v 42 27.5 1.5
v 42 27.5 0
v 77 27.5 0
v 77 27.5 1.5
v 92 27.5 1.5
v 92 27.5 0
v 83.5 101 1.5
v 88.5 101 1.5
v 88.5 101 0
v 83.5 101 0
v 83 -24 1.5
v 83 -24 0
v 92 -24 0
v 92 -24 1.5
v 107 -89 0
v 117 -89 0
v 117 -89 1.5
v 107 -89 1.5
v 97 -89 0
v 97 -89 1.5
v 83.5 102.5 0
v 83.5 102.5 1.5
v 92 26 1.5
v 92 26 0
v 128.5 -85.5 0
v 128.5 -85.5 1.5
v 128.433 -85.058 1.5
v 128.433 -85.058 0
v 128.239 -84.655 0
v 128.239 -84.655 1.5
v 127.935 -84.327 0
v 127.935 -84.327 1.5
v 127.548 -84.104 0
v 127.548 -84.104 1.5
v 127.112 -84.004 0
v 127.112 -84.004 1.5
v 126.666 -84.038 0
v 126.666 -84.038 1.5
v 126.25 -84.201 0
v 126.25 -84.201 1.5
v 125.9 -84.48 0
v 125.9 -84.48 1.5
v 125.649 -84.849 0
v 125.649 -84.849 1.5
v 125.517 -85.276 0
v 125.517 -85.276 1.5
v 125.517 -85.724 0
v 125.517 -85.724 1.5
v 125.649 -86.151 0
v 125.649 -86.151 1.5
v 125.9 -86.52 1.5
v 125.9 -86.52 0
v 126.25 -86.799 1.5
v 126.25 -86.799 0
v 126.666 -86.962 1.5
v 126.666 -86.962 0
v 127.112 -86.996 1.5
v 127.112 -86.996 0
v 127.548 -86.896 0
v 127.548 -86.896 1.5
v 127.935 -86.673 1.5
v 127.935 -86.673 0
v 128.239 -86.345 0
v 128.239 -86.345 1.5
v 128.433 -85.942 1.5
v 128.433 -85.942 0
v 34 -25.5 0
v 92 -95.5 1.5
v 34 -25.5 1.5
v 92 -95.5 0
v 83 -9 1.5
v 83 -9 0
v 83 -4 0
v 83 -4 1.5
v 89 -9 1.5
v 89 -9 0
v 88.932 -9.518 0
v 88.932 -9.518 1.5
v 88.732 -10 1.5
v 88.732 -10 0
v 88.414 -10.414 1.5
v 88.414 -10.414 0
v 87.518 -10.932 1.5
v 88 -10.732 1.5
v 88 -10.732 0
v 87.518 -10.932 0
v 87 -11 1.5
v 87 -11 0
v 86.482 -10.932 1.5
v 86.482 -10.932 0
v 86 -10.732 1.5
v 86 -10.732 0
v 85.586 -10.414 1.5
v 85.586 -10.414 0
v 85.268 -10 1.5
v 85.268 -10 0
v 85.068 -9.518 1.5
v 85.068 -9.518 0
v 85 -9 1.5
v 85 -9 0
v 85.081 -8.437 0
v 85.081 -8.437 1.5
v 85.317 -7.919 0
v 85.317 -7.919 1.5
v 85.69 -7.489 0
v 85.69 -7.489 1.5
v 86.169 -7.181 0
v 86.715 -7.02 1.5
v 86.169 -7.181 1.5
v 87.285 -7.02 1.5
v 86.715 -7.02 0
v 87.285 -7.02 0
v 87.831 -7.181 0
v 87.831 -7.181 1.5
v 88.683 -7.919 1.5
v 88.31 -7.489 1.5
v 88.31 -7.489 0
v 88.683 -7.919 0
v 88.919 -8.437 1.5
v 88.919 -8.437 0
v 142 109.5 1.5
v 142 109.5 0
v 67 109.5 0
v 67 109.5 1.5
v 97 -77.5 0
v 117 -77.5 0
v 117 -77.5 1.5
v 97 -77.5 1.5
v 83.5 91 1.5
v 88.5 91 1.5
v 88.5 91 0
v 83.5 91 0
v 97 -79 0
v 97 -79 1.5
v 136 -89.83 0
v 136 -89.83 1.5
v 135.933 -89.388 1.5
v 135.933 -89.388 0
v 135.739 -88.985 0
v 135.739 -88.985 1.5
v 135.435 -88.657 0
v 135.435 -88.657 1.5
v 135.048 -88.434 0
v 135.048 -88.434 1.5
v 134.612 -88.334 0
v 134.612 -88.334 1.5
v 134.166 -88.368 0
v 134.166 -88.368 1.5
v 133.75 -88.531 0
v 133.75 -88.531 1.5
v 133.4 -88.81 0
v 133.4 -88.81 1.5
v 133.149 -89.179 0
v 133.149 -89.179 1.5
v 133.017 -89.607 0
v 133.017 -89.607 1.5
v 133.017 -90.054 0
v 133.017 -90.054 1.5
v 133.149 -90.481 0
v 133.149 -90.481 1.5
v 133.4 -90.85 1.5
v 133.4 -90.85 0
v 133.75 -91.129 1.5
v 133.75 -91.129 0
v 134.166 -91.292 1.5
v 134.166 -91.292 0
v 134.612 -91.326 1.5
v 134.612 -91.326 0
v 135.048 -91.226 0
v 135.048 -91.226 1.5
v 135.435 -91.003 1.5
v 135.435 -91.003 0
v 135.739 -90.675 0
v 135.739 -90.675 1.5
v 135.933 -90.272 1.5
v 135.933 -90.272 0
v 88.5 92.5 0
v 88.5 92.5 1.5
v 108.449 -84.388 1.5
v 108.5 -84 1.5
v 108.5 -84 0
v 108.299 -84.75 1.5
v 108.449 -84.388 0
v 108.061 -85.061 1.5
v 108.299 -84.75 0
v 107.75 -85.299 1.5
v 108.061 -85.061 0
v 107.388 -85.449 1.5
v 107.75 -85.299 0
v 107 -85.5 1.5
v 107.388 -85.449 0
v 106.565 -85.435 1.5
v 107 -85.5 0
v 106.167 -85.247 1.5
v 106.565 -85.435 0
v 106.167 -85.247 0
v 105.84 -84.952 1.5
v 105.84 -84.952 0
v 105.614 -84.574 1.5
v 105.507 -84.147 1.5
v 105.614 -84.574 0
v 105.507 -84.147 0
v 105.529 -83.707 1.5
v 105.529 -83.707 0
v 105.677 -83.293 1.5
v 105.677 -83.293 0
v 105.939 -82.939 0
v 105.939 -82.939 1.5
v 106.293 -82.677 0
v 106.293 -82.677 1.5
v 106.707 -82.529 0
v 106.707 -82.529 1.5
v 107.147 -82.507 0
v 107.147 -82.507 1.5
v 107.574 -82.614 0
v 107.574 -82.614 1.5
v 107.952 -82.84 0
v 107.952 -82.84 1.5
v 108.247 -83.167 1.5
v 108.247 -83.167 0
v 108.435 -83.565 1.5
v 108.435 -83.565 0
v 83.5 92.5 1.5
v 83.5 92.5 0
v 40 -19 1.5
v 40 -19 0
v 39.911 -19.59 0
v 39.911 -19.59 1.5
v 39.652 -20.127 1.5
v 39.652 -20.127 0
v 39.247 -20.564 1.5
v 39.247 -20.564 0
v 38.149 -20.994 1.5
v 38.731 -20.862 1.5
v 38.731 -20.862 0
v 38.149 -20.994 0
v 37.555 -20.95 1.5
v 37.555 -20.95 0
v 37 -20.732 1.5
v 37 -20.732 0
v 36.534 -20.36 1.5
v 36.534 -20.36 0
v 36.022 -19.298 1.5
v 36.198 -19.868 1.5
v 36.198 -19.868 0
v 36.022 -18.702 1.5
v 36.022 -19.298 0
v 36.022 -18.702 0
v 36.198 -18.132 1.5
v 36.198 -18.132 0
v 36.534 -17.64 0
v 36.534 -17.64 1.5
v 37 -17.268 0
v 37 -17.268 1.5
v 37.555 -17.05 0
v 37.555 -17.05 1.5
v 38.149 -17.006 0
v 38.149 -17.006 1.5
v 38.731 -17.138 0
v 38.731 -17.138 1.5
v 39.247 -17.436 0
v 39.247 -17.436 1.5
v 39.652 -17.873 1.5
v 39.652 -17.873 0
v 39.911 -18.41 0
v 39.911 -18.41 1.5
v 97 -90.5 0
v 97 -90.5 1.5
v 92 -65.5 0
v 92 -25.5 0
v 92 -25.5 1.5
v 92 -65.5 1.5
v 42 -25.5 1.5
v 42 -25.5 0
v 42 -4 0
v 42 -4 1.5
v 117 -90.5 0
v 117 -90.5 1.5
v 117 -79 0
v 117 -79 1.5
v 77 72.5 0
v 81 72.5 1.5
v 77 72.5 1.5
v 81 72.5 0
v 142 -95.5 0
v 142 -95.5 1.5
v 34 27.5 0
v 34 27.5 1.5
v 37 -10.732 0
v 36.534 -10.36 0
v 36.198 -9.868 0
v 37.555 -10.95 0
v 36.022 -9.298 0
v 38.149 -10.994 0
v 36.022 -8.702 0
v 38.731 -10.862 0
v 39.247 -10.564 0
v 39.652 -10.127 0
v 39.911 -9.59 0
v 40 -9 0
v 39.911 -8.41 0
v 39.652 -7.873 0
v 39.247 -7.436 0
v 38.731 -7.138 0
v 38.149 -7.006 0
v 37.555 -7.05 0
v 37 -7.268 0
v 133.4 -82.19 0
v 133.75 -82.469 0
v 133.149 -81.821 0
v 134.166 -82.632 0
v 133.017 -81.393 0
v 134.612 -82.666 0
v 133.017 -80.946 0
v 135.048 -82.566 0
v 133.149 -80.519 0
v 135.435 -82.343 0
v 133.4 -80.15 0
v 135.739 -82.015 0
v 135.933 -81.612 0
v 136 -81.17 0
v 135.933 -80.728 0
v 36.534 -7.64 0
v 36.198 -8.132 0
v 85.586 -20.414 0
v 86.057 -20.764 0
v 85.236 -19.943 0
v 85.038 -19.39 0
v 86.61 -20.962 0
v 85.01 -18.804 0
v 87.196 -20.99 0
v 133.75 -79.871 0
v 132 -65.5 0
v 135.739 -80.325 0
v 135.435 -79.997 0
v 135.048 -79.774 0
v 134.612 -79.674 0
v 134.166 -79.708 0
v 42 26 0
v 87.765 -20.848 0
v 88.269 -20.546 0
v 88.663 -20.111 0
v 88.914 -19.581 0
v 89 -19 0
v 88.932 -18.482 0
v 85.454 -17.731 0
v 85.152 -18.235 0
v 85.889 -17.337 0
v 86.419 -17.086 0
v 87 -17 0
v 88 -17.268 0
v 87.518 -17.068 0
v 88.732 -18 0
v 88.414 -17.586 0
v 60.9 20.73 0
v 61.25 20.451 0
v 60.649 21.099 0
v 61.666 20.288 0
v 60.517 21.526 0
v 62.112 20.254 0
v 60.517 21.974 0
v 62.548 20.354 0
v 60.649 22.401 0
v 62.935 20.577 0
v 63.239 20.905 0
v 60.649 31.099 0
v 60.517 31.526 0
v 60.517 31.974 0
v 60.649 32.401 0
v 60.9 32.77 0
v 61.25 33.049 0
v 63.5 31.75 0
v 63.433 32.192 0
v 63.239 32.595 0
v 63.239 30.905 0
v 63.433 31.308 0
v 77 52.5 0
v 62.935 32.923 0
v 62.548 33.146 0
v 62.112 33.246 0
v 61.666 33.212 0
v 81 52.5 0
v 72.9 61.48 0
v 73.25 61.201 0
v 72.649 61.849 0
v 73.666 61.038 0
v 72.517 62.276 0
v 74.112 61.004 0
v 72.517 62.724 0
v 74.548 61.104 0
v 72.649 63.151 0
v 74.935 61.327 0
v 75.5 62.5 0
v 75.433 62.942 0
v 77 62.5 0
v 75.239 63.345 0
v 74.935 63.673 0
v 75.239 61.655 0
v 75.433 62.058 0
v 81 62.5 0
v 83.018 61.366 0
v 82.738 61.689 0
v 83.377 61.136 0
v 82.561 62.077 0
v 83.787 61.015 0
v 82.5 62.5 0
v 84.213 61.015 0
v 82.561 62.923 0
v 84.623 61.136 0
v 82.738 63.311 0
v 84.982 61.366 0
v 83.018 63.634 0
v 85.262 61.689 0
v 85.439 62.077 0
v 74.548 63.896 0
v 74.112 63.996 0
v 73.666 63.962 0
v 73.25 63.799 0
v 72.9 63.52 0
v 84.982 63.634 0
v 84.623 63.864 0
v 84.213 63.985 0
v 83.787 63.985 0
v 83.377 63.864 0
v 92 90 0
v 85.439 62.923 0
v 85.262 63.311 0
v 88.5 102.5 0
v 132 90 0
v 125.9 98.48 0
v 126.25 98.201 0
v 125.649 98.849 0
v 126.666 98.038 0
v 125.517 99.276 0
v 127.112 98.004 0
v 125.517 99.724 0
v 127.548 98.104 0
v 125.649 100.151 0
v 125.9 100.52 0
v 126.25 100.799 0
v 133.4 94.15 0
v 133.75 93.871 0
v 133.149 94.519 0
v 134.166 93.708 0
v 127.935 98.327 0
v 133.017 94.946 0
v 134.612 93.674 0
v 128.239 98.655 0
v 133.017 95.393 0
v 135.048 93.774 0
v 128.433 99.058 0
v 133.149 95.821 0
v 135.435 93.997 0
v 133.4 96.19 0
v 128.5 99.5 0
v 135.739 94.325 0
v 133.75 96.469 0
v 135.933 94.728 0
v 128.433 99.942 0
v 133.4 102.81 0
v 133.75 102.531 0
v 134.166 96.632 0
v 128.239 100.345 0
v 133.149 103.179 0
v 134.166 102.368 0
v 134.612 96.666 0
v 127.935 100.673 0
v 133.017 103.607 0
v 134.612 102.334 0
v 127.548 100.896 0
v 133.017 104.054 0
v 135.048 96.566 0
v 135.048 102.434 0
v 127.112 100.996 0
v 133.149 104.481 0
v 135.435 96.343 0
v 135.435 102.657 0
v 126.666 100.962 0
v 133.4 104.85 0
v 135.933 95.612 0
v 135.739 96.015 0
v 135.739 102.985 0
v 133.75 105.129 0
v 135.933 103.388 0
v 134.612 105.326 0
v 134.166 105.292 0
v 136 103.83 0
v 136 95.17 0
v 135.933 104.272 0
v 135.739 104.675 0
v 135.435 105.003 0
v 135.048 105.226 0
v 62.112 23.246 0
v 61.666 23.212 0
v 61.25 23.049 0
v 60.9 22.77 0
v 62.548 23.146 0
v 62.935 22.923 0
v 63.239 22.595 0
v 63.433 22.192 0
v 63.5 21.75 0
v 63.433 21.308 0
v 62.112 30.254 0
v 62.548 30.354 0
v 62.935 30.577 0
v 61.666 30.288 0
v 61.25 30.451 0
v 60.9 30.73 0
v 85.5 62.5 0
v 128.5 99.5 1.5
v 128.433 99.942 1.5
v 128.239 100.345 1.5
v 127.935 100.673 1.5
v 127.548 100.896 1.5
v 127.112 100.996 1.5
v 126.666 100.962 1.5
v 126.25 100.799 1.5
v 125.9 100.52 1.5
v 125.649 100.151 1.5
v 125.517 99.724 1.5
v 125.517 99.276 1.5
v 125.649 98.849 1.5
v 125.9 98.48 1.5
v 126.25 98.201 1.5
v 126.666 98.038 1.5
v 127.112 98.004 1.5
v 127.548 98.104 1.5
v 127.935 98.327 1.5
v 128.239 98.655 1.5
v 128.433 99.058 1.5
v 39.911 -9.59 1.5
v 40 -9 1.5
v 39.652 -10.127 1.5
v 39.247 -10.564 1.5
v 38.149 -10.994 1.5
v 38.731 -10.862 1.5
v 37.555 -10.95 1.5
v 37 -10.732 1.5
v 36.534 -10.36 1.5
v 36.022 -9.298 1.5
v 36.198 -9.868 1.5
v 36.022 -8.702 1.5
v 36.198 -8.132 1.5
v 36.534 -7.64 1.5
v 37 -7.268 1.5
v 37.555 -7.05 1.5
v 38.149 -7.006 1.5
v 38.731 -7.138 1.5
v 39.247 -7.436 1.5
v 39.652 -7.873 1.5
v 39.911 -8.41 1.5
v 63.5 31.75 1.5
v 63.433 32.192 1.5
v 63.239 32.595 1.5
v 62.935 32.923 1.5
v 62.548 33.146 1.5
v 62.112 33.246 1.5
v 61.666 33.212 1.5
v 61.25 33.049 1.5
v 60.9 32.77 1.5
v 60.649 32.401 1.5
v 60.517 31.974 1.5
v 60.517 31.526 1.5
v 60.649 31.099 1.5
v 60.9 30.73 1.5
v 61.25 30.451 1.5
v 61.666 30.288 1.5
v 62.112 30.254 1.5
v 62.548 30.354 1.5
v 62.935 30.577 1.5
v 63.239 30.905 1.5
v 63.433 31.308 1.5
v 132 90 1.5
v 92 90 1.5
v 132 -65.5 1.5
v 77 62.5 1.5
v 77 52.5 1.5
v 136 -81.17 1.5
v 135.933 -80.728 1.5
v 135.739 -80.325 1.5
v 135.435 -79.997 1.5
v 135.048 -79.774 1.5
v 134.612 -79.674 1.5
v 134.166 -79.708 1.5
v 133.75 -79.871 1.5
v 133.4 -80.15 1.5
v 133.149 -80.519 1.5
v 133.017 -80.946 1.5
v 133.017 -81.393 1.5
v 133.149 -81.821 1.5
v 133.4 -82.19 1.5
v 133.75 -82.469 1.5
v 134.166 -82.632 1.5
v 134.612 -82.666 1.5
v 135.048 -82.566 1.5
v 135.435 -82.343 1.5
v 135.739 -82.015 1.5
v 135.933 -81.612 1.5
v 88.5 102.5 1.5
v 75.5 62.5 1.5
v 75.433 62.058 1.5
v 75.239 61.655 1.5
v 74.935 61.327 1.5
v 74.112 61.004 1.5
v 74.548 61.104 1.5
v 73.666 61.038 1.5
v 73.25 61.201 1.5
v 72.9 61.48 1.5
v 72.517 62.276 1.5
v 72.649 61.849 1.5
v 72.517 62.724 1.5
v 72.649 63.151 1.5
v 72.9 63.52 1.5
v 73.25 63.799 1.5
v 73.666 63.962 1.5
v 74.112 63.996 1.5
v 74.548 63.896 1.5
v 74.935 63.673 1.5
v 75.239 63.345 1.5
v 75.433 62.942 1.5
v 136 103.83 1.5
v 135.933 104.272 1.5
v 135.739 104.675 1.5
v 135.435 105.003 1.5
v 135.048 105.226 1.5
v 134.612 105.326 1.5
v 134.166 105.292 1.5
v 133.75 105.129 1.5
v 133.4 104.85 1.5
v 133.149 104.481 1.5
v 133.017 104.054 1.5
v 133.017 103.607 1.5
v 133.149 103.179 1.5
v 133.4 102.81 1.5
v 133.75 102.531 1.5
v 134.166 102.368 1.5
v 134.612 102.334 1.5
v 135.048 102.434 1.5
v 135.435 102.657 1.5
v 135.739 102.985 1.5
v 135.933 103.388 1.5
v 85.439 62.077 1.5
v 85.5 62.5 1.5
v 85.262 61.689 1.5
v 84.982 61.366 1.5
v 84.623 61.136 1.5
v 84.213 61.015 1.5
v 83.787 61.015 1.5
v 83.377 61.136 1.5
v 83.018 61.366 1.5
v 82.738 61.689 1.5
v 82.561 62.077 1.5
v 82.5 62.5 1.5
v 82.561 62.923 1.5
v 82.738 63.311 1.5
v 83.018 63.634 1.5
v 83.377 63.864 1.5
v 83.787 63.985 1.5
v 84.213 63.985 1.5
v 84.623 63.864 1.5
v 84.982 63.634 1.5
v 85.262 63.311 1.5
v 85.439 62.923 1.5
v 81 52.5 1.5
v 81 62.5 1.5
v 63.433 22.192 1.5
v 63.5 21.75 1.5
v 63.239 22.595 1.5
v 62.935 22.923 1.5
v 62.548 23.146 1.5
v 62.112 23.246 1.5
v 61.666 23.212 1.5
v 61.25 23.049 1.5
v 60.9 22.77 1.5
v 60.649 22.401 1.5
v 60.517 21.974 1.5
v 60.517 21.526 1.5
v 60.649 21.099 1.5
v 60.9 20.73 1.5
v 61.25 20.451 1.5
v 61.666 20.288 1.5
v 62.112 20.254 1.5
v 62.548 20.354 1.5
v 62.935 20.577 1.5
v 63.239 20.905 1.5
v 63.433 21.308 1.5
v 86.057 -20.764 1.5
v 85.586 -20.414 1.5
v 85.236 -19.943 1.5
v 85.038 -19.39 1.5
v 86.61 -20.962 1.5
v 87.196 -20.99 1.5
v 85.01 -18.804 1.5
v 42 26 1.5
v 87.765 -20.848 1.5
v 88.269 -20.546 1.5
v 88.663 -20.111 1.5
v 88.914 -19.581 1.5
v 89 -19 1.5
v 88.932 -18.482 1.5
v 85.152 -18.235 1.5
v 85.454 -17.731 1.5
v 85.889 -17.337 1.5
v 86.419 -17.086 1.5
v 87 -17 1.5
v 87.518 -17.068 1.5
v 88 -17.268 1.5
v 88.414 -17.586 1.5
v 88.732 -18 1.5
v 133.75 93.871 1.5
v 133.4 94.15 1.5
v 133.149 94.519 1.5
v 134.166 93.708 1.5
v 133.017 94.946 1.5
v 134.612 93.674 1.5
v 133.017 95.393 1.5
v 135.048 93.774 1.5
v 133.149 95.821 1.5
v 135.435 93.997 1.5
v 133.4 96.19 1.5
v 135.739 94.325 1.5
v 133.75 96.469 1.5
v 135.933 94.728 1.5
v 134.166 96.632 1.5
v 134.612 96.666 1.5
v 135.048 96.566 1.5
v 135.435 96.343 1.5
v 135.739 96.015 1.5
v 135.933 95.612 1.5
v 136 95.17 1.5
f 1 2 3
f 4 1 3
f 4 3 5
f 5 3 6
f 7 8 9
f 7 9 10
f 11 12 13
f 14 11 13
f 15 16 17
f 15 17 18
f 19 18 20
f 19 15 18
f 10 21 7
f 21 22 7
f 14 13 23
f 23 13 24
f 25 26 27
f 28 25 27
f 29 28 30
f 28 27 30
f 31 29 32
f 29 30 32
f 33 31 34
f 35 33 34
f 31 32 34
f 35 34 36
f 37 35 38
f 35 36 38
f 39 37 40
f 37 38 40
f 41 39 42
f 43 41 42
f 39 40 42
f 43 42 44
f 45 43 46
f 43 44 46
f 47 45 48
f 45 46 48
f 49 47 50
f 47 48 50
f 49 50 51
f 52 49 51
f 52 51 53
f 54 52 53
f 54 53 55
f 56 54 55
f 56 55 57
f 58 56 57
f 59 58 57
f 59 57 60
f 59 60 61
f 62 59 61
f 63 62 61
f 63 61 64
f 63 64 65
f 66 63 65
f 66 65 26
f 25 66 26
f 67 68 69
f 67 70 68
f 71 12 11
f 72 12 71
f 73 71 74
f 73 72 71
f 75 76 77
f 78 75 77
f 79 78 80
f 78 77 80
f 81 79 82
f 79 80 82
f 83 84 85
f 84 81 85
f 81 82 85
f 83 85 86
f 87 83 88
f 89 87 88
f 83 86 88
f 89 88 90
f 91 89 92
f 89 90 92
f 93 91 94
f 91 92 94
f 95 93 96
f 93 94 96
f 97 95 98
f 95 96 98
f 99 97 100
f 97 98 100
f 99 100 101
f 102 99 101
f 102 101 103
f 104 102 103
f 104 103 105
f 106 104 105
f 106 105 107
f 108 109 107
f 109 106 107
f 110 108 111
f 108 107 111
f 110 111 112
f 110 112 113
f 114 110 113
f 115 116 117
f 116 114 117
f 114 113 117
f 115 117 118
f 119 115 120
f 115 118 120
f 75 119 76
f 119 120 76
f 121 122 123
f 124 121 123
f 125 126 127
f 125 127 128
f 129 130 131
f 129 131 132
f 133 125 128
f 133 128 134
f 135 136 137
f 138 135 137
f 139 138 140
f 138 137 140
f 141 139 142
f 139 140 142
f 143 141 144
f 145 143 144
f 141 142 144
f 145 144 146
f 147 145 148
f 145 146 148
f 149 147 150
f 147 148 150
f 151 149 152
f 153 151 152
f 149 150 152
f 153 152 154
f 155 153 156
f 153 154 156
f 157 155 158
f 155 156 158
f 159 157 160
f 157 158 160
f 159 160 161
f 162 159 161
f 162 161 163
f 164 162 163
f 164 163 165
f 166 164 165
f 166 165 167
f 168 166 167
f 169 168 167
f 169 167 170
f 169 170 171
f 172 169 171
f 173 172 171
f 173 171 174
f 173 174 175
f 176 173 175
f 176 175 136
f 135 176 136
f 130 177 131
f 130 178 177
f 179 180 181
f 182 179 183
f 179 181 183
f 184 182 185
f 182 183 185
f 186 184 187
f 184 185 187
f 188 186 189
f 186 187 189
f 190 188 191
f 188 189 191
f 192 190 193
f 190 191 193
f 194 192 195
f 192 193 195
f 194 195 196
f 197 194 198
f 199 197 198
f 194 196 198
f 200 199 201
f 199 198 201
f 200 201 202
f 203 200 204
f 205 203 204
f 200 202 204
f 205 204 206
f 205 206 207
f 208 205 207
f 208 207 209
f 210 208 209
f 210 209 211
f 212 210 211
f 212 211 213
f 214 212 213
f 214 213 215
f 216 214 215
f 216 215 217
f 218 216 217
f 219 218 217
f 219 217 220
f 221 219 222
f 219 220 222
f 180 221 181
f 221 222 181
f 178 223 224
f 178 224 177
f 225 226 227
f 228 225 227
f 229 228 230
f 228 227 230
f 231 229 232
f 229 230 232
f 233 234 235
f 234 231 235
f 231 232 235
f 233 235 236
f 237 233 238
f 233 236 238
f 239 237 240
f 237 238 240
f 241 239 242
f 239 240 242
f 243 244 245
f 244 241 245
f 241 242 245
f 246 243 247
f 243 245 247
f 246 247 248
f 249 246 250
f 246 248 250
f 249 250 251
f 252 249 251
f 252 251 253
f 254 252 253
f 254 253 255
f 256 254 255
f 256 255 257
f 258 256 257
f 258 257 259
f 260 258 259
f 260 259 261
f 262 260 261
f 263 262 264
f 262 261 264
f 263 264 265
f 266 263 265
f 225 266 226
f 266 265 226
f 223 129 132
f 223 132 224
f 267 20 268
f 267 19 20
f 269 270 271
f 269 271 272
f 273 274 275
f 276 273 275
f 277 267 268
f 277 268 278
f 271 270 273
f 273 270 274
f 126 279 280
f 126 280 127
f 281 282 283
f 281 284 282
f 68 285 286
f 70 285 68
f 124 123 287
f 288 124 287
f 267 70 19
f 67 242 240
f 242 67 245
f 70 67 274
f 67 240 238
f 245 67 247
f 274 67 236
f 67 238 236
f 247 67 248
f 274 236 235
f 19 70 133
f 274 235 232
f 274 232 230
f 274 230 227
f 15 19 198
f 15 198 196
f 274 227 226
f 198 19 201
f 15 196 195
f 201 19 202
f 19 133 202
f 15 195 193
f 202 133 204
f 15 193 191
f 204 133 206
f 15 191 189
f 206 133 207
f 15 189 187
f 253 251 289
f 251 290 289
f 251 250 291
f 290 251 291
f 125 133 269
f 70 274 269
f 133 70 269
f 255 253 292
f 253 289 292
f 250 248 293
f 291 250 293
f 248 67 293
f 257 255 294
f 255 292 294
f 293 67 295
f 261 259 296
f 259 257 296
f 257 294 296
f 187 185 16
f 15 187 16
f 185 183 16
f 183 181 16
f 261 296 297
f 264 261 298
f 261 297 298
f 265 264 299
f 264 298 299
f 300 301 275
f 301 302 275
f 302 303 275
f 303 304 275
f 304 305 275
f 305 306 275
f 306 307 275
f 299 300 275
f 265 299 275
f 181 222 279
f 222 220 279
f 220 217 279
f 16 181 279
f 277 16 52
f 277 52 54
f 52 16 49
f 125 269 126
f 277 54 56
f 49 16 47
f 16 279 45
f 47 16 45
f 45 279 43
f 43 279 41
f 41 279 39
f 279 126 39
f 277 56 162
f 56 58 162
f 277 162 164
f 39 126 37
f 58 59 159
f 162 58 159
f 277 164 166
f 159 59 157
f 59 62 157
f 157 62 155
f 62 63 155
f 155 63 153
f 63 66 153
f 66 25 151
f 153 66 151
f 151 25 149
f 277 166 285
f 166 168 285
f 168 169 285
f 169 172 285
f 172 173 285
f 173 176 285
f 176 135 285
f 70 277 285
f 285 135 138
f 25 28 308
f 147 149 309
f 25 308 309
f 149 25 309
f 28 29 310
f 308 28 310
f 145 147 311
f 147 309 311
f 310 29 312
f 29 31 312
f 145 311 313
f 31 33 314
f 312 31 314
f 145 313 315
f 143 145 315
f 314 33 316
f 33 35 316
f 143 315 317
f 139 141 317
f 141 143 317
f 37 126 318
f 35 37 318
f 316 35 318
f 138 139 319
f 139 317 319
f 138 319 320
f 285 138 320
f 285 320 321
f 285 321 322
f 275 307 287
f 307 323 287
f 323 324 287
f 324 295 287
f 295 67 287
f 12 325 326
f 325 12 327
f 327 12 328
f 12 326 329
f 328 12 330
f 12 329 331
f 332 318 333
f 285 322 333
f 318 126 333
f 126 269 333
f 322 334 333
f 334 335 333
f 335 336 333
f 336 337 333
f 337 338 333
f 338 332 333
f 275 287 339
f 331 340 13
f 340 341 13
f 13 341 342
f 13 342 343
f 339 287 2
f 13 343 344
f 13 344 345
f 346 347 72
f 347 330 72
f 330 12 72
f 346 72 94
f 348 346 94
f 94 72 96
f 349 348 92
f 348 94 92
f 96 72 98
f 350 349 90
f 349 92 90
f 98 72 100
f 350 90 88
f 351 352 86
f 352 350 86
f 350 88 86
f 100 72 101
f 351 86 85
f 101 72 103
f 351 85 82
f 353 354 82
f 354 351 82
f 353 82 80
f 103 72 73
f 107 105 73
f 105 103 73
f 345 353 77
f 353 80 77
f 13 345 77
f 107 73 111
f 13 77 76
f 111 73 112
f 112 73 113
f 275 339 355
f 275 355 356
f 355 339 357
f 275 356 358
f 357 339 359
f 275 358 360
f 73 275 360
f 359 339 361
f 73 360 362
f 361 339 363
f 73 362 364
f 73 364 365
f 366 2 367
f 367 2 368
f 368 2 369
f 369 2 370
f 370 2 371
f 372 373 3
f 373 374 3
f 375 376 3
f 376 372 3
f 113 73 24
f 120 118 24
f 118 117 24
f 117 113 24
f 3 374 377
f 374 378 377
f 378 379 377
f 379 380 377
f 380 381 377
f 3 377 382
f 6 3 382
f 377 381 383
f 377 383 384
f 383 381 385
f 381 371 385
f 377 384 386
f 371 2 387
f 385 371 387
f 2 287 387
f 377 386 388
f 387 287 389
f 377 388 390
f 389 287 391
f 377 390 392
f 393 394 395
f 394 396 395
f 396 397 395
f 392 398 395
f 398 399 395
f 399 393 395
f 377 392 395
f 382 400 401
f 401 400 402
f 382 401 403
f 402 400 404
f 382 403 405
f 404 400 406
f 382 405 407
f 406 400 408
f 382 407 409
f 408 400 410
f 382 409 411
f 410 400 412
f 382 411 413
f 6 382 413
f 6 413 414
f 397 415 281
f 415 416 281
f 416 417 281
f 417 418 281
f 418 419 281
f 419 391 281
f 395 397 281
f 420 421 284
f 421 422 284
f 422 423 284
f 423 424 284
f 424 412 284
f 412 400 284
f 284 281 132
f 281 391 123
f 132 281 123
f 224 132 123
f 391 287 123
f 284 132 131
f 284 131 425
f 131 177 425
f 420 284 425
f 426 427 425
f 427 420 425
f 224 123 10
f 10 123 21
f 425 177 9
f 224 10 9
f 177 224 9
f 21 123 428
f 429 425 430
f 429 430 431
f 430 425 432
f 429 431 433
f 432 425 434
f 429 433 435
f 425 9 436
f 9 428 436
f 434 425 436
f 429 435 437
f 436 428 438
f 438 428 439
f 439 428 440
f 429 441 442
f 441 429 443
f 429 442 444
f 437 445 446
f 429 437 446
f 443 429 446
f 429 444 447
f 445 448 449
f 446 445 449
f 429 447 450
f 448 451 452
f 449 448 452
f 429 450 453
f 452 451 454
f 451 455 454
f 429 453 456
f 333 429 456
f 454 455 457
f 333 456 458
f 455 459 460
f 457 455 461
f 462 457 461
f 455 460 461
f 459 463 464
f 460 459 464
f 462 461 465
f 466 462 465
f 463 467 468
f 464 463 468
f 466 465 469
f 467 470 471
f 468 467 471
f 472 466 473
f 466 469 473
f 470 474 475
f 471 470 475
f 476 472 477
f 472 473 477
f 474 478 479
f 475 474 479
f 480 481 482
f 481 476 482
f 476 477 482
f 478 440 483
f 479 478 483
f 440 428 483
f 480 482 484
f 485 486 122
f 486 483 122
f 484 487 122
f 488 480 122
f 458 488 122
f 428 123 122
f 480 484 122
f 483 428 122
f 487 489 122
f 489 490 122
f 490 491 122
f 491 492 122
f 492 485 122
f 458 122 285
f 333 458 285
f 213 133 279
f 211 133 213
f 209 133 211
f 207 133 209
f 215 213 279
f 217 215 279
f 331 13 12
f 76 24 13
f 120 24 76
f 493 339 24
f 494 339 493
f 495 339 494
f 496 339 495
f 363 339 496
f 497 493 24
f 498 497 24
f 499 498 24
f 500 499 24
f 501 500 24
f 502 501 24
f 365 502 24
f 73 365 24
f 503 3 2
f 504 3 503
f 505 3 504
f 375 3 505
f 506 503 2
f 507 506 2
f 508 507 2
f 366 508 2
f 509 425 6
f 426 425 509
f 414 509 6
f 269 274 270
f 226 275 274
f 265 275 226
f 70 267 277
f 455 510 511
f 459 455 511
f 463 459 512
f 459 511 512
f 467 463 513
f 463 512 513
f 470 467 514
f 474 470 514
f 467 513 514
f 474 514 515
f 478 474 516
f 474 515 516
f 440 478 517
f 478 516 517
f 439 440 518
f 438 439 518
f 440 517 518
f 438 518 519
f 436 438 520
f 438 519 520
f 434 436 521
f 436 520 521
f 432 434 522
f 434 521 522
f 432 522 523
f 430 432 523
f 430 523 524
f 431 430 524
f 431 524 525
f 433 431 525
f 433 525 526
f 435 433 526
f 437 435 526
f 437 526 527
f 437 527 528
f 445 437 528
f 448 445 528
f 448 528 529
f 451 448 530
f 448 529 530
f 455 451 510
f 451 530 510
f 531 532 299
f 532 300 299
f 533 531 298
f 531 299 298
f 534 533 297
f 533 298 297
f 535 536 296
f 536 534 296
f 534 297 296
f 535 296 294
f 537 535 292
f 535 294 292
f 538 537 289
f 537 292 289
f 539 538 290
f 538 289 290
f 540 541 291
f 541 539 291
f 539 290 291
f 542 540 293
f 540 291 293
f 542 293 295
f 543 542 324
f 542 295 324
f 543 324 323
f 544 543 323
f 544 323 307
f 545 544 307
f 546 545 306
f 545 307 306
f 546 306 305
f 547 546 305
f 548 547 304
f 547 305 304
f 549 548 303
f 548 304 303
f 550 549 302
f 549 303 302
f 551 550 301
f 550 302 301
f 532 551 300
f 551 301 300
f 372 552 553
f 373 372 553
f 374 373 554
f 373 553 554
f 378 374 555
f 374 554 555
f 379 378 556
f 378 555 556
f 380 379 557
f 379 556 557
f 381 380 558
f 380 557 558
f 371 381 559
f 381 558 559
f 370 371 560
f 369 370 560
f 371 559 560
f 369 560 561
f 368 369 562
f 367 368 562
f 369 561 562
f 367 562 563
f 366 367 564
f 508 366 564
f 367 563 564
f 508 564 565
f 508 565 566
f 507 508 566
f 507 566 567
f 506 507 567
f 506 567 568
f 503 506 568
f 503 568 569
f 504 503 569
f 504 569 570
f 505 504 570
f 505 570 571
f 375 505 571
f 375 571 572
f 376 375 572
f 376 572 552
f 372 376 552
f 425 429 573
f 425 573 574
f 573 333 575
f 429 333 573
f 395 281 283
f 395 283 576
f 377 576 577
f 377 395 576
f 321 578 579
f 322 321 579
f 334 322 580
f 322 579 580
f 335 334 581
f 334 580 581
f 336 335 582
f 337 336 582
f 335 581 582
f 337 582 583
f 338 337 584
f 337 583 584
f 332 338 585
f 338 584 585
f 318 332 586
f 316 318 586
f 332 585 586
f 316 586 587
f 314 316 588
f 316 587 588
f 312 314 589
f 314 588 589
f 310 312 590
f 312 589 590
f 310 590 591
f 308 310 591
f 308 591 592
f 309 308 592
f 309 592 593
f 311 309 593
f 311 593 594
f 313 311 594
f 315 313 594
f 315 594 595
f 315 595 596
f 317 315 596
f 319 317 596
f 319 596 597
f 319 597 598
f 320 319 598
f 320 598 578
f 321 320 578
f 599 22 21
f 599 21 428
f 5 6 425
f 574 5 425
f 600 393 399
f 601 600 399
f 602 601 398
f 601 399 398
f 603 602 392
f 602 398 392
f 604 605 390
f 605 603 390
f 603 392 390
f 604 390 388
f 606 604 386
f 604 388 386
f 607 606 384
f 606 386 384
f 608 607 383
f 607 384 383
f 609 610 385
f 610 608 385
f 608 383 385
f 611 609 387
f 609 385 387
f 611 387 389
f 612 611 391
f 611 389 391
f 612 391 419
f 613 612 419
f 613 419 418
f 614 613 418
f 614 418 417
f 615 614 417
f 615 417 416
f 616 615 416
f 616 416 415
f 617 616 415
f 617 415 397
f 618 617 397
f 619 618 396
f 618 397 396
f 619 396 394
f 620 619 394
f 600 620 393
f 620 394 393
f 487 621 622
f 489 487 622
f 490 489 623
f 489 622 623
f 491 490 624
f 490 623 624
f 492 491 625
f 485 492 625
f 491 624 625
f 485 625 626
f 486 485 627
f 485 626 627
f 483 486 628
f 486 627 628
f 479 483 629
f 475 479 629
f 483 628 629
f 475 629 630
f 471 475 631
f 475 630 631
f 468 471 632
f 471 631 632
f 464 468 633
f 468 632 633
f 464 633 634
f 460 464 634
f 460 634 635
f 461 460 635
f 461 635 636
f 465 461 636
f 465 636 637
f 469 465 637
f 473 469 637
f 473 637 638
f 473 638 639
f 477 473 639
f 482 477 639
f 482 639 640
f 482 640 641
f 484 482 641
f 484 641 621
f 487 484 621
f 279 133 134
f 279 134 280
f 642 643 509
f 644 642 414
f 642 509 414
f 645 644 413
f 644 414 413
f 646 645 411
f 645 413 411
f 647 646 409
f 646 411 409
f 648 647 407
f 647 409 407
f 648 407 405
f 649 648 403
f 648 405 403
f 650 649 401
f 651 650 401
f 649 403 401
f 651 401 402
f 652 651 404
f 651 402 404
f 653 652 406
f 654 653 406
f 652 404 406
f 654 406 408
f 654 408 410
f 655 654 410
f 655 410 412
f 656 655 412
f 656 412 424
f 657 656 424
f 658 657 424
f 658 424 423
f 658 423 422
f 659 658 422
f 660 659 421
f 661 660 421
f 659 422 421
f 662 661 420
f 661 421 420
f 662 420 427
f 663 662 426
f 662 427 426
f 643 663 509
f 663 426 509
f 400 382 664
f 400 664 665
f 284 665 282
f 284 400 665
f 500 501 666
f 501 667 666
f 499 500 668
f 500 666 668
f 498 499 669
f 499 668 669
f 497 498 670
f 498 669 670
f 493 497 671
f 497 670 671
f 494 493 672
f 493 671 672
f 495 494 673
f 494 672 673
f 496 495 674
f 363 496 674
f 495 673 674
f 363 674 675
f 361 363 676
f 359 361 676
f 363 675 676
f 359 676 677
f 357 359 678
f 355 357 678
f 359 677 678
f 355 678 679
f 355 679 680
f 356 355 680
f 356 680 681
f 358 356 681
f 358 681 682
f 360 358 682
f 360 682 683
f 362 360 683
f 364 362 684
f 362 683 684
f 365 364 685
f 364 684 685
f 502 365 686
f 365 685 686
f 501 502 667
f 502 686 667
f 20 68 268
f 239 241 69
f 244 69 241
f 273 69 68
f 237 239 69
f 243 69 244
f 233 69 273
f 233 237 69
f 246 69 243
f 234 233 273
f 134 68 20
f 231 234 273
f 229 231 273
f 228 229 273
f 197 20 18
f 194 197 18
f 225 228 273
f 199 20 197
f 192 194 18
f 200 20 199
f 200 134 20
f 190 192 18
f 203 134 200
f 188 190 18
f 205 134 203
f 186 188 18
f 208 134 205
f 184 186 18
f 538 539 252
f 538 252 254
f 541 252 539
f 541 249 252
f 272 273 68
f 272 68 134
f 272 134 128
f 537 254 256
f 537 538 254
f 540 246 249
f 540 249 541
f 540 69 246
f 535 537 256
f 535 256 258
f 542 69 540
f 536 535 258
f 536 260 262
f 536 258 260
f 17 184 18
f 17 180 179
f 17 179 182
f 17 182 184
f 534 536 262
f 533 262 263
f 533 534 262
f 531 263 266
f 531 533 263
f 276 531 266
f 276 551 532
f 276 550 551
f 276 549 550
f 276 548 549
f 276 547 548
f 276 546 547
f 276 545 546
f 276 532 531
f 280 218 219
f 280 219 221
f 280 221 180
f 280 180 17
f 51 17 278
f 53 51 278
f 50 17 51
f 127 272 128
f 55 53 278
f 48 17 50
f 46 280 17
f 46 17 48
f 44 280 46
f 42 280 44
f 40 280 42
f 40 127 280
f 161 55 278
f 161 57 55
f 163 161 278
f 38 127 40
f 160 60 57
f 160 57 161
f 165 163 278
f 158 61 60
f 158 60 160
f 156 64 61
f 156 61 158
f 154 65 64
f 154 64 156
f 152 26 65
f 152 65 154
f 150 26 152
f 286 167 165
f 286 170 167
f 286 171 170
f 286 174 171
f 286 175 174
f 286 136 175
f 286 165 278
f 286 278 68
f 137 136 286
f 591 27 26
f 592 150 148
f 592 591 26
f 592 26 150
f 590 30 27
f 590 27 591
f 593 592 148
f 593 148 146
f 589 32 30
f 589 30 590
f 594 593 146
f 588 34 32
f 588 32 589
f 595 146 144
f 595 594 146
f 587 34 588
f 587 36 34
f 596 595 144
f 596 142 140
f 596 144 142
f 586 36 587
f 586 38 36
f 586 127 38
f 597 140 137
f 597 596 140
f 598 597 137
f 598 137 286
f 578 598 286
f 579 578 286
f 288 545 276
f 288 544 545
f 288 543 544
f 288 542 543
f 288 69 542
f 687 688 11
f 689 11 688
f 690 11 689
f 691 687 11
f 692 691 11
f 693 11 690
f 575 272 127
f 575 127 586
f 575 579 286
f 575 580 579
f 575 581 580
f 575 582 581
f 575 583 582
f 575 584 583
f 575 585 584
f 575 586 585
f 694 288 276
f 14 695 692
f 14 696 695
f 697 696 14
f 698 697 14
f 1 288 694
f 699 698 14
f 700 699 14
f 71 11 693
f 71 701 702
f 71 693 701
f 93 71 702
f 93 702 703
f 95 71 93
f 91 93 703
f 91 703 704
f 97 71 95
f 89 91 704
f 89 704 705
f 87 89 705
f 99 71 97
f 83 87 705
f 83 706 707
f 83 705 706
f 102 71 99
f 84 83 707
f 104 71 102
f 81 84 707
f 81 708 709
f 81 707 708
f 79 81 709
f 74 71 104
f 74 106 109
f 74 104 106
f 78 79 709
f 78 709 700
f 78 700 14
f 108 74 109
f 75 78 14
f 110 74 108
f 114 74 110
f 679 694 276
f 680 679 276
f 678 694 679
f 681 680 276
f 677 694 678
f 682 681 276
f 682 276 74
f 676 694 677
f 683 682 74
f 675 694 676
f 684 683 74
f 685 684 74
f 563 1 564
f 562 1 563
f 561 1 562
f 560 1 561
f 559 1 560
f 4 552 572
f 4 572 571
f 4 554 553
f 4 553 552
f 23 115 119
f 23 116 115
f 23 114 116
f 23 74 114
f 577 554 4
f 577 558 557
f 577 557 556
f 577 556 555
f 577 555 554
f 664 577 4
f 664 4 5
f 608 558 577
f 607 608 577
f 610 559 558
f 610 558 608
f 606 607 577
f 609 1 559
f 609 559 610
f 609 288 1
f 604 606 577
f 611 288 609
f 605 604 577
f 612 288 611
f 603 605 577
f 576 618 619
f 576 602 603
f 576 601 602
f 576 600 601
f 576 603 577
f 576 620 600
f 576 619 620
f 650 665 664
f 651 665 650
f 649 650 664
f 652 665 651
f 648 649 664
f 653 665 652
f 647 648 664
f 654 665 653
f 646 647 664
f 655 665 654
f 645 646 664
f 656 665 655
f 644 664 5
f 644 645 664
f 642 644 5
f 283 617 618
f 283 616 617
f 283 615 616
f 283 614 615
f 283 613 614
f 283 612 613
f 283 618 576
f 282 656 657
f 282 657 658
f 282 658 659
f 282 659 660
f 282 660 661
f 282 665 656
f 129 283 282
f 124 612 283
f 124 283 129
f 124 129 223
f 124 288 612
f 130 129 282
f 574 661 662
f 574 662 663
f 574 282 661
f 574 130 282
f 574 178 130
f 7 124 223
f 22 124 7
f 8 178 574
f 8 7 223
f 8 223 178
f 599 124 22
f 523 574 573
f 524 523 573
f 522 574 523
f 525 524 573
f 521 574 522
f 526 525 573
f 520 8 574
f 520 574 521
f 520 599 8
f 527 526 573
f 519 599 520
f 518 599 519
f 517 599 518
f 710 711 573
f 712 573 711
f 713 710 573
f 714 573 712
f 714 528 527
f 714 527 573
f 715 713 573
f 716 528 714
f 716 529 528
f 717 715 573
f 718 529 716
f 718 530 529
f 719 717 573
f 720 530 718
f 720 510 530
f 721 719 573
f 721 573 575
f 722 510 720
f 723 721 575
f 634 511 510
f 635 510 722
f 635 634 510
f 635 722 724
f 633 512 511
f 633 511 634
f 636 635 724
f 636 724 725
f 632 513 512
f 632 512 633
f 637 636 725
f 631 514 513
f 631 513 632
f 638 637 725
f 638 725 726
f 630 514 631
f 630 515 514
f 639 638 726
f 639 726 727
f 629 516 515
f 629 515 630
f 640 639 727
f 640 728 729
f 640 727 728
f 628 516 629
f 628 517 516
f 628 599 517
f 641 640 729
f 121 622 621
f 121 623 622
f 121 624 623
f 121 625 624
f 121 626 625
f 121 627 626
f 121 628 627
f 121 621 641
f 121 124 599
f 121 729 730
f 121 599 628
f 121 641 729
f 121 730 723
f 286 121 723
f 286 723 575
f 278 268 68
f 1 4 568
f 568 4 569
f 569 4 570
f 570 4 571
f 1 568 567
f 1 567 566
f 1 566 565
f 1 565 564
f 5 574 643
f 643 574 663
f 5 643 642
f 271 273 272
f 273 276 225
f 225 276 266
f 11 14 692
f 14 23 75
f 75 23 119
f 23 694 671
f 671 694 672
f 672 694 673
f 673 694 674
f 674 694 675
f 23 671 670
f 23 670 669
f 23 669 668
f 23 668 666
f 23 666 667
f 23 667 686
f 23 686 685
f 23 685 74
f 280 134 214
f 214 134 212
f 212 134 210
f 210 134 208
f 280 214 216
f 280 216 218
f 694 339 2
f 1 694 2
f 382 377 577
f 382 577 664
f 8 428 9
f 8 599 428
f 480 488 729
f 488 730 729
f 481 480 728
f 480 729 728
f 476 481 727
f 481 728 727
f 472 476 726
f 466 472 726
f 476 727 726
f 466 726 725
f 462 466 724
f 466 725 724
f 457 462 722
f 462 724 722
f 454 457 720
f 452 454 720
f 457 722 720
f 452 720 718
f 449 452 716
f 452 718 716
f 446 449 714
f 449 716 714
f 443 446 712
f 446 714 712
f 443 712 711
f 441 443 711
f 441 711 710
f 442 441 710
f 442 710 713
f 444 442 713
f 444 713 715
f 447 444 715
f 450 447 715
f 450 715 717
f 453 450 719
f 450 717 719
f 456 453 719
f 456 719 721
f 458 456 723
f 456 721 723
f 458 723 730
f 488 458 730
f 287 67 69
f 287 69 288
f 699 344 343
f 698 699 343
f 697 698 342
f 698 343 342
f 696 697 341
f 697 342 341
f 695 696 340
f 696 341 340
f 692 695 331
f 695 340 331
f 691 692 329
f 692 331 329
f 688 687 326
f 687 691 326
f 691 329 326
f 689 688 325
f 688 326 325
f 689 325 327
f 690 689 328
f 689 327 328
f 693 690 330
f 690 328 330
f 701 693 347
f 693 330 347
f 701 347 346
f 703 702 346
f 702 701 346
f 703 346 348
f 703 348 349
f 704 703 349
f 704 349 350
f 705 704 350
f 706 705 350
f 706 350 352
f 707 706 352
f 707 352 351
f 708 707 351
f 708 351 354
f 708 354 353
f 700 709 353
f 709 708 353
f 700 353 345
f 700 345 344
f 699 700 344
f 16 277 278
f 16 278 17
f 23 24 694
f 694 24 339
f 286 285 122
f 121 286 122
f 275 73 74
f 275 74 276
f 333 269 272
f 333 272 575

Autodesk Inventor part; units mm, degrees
ref_plane "YZ Plane" through (0, 0, 0) normal (1, 0, 0) x (0, 1, 0)
ref_plane "XZ Plane" through (0, 0, 0) normal (0, 1, 0) x (-1, 0, 0)
ref_plane "XY Plane" through (0, 0, 0) normal (0, 0, 1) x (1, 0, 0)
sketch "Sketch1" plane through (0, 0, 0) normal (0, 0, 1) x (1, 0, 0)
  line L0 (95, 60) -> (105, 60)
  line L1 (105, 60) -> (105, 10)
  line L2 (105, 10) -> (100, 10)
  line L3 (100, 10) -> (100, 20)
  line L4 (100, 20) -> (95, 20)
  line L5 (95, 20) -> (95, 60)
  line L6 (105, -60) -> (95, -60)
  line L7 (95, -60) -> (95, -20)
  line L8 (95, -20) -> (100, -20)
  line L9 (100, -20) -> (100, -10)
  line L10 (100, -10) -> (105, -10)
  line L11 (105, -10) -> (105, -60)
  line L12 (120.5, 3.5) -> (123.5, 3.5)
  line L13 (123.5, 3.5) -> (123.5, 5)
  line L14 (123.5, 5) -> (127, 5)
  line L15 (127, 5) -> (127, -5)
  line L16 (127, -5) -> (123.5, -5)
  line L17 (123.5, -5) -> (123.5, -3.5)
  line L18 (123.5, -3.5) -> (120.5, -3.5)
  line L19 (120.5, -3.5) -> (120.5, -5)
  line L20 (120.5, -5) -> (117, -5)
  line L21 (117, -5) -> (117, -49)
  line L22 (117, -49) -> (107, -51)
  line L23 (107, -51) -> (107, -10)
  line L24 (107, -10) -> (112, -10)
  line L25 (112, -10) -> (112, -3.5)
  line L26 (112, -3.5) -> (100, -3.5)
  line L27 (100, -3.5) -> (100, -4)
  line L28 (100, -4) -> (45, -4)
  arc A0 (43, -6) -> (45, -4) centre (43, -4) ccw
  line L29 (43, -6) -> (42, -6)
  arc A1 (40, -4) -> (42, -6) centre (42, -4) ccw
  line L30 (40, -4) -> (5, -4)
  arc A2 (3, -6) -> (5, -4) centre (3, -4) ccw
  line L31 (3, -6) -> (2, -6)
  arc A3 (0, -4) -> (2, -6) centre (2, -4) ccw
  line L32 (0, -4) -> (0, 4)
  arc A4 (2, 6) -> (0, 4) centre (2, 4) ccw
  line L33 (2, 6) -> (3, 6)
  arc A5 (5, 4) -> (3, 6) centre (3, 4) ccw
  line L34 (5, 4) -> (40, 4)
  arc A6 (42, 6) -> (40, 4) centre (42, 4) ccw
  line L35 (42, 6) -> (43, 6)
  arc A7 (45, 4) -> (43, 6) centre (43, 4) ccw
  line L36 (45, 4) -> (100, 4)
  line L37 (100, 4) -> (100, 3.5)
  line L38 (100, 3.5) -> (112, 3.5)
  line L39 (112, 3.5) -> (112, 10)
  line L40 (112, 10) -> (107, 10)
  line L41 (107, 10) -> (107, 51)
  line L42 (107, 51) -> (117, 49)
  line L43 (117, 49) -> (117, 5)
  line L44 (117, 5) -> (120.5, 5)
  line L45 (120.5, 5) -> (120.5, 3.5)
  line L46 (92, 27.5) -> (92, 26)
  line L47 (92, 26) -> (42, 26)
  line L48 (42, 26) -> (42, 27.5)
  line L49 (42, 27.5) -> (92, 27.5)
  line L50 (92, -24) -> (92, -25.5)
  line L51 (92, -25.5) -> (42, -25.5)
  line L52 (42, -25.5) -> (42, -24)
  line L53 (42, -24) -> (92, -24)
  line L54 (92, -25.5) -> (82, -25.5)
  line L55 (82, -25.5) -> (82, -24)
  line L56 (82, -24) -> (77, -24)
  line L57 (77, -24) -> (77, -25.5)
  line L58 (77, -25.5) -> (57, -25.5)
  line L59 (57, -25.5) -> (57, -24)
  line L60 (57, -24) -> (52, -24)
  line L61 (52, -24) -> (52, -25.5)
  line L62 (52, -25.5) -> (42, -25.5)
  line L63 (42, -25.5) -> (42, 27.5)
  line L64 (92, 27.5) -> (92, 97.5)
  line L65 (92, -25.5) -> (92, -65.5)
  line L66 (92, -65.5) -> (132, -65.5)
  line L67 (132, -65.5) -> (142, -65.5)
  line L68 (132, -65.5) -> (132, 97.5)
  line L69 (142, -65.5) -> (142, 109.5)
  line L70 (42, 27.5) -> (34, 27.5)
  line L71 (95, 60) -> (105, 60)
  line L72 (105, 60) -> (105, 84)
  line L73 (105, 84) -> (95, 84)
  line L74 (95, 84) -> (95, 60)
  line L75 (95, 60) -> (95, 90)
  line L76 (95, 90) -> (132, 90)
  line L77 (95, 90) -> (92, 90)
  line L78 (142, -65.5) -> (142, -95.5)
  line L79 (142, -95.5) -> (92, -95.5)
  line L80 (92, -95.5) -> (34, -25.5)
  line L81 (34, -25.5) -> (34, 27.5)
  line L82 (0, 0) -> (71, 0)
  line L83 (23.8389, -219.7015) -> (66.8389, -219.7015)
  line L84 (66.8389, -219.7015) -> (66.8389, -198.7015)
  line L85 (66.8389, -198.7015) -> (23.8389, -198.7015)
  line L86 (23.8389, -198.7015) -> (23.8389, -219.7015)
  line L87 (45.3389, -198.7015) -> (45.3389, -219.7015)
  line L88 (66.8389, -198.7015) -> (66.8389, -203.7015)
  line L89 (66.8389, -203.7015) -> (70.8389, -203.7015)
  line L90 (70.8389, -203.7015) -> (70.8389, -213.7015)
  circle A8 centre (70.8389, -213.7015) radius 2
  circle A9 centre (70.8389, -203.7015) radius 2
  line L91 (66.8389, -209.2015) -> (56.8389, -209.2015)
  line L92 (56.8389, -209.2015) -> (56.8389, -189.2015)
  line L93 (56.8389, -189.2015) -> (56.8389, -229.2015)
  circle A10 centre (19.8389, -213.7015) radius 2
  circle A11 centre (19.8389, -203.7015) radius 2
  line L94 (33.8389, -189.2015) -> (33.8389, -229.2015)
  line L95 (42, -24) -> (83, -24)
  line L96 (83, -24) -> (83, -4)
  line L97 (83, -4) -> (42, -4)
  line L98 (42, -4) -> (42, -24)
  line L99 (62.5, -4) -> (62.5, -24)
  line L100 (83, -4) -> (83, -9)
  line L101 (83, -9) -> (87, -9)
  line L102 (87, -9) -> (87, -19)
  circle A12 centre (87, -9) radius 2
  circle A13 centre (87, -19) radius 2
  circle A14 centre (38, -9) radius 2
  circle A15 centre (38, -19) radius 2
  line L103 (92, -24) -> (92, 26)
  line L104 (109.5, -120.7576) -> (69.5, -120.7576)
  line L105 (69.5, -120.7576) -> (69.5, 125.4146)
  line L106 (142, 109.5) -> (67, 109.5)
  line L107 (67, 109.5) -> (67, 109.5)
  line L108 (67, 109.5) -> (34, 27.5)
  line L109 (34, 27.5) -> (69.5, 27.5)
  line L110 (69.5, 27.5) -> (69.5, 52.5)
  line L111 (92, 27.5) -> (69.5, 27.5)
  line L112 (92, 27.5) -> (77, 27.5)
  line L113 (77, 27.5) -> (77, 52.5)
  line L114 (77, 52.5) -> (78.5, 52.5)
  line L115 (78.5, 72.5) -> (77, 72.5)
  line L116 (77, 72.5) -> (77, 52.5)
  line L117 (78.5, 52.5) -> (81, 52.5)
  line L118 (81, 52.5) -> (81, 72.5)
  line L119 (81, 72.5) -> (78.5, 72.5)
  line L120 (81, 62.5) -> (79, 62.5)
  line L121 (79, 62.5) -> (74, 62.5)
  line L122 (74, 62.5) -> (84, 62.5)
  circle A16 centre (74, 62.5) radius 1.5
  circle A17 centre (84, 62.5) radius 1.5
  line L123 (92, -95.5) -> (92, -90.5)
  line L124 (92, -90.5) -> (97, -90.5)
  line L125 (97, -90.5) -> (117, -90.5)
  line L126 (117, -90.5) -> (117, -89)
  line L127 (117, -89) -> (97, -89)
  line L128 (97, -89) -> (97, -90.5)
  line L129 (97, -89) -> (97, -79)
  line L130 (97, -79) -> (117, -79)
  line L131 (117, -79) -> (117, -77.5)
  line L132 (117, -77.5) -> (97, -77.5)
  line L133 (97, -77.5) -> (97, -79)
  line L134 (107, -90.5) -> (107, -84)
  circle A18 centre (107, -84) radius 1.5
  point P0 (59.5188, -93.2152)
  point P1 (83, -4)
  point P2 (83, -24)
  dimension "d0" = 10
  dimension "d1" = 1.5
  dimension "d2" = 5
  dimension "d3" = 1.5
  dimension "d4" = 20
  dimension "d5" = 1.5
  dimension "d6" = 5
  dimension "d7" = 1.5
  dimension "d8" = 70
  dimension "d9" = 40
  dimension "d10" = 40
  dimension "d11" = 40
  dimension "d12" = 10
  dimension "d13" = 175
  dimension "d14" = 8
  dimension "d15" = 10
  dimension "d16" = 24
  dimension "d17" = 30
  dimension "d19" = 30
  dimension "d20" = 50
  dimension "d21" = 71
  dimension "d22" = 43
  dimension "d23" = 21
  dimension "d24" = 5
  dimension "d25" = 4
  dimension "d26" = 10
  dimension "d27" = 4
  dimension "d28" = 4
  dimension "d29" = 10
  dimension "d30" = 20
  dimension "d31" = 40
  dimension "d32" = 41
  dimension "d33" = 20
  dimension "d34" = 5
  dimension "d35" = 4
  dimension "d36" = 10
  dimension "d37" = 4
  dimension "d38" = 4
  dimension "d48" = 40
  dimension "d49" = 3
  dimension "d50" = 75
  dimension "d51" = 0
  dimension "d62" = 15
  dimension "d63" = 25
  dimension "d64" = 1.5
  dimension "d65" = 20
  dimension "d73" = 2.5
  dimension "d74" = 2
  dimension "d75" = 5
  dimension "d76" = 10
  dimension "d77" = 3
  dimension "d78" = 3
  dimension "d81" = 5
  dimension "d82" = 5
  dimension "d83" = 20
  dimension "d84" = 1.5
  dimension "d85" = 10
  dimension "d86" = 20
  dimension "d87" = 1.5
  dimension "d88" = 3
extrude "Extrusion1" add sketch "Sketch1" along normal blind 1.5 contours A16 | A17 | L116 L121 L120 L118 L117 L114 | L77 L64 L49 L105 L106 L69 L67 L68 L76 | L133 L132 L131 L130 | A18 | L128 L127 L134 L125 | L67 L78 L79 L80 L105 L51 L65 L66 | L103 L36 L105 L47 | L105 L36 A7 L35 L63 L47 | L103 L28 L105 L36 | L49 L70 L108 L106 L105 | L53 L96 L28 L103 | L63 A6 L34 L81 L70 L48 | L105 L82 L63 L35 A7 L36 | L116 L115 L119 L118 L120 L121 | L80 L81 L30 A1 L63 L52 L51 L105 | L63 L82 L81 L34 A6 | L105 L28 L97 L63 L82 | L63 A1 L30 L81 L82 | L134 L127 L126 L125
sketch "Sketch2" plane through (0, 0, 1.5) normal (0, 0, 1) x (1, 0, 0)
  line L0 (42, 26) -> (42, 27.5) projected
  line L1 (42, 26.75) -> (62, 26.75)
  line L2 (62, 26.75) -> (62, 31.75)
  line L3 (62, 31.75) -> (62, 21.75)
  circle A0 centre (62, 31.75) radius 1.5
  circle A1 centre (62, 21.75) radius 1.5
  point P0 (0, 0)
  dimension "d41" = 20
  dimension "d42" = 5
  dimension "d43" = 10
  dimension "d44" = 3
  dimension "d45" = 3
extrude "Extrusion2" cut sketch "Sketch2" against normal blind 1.5
extrude "Extrusion5" cut sketch "Sketch1" along normal blind 1.5 contours A16 | A17 | L116 L121 L120 L118 L117 L114 | L116 L115 L119 L118 L120 L121
extrude "Extrusion6" cut sketch "Sketch1" along normal blind 1.5 contours L133 L132 L131 L130 | A18 | L128 L127 L134 L125 | L134 L127 L126 L125
sketch "Sketch3" plane through (0, 0, 1.5) normal (0, 0, 1) x (1, 0, 0)
  line L0 (81, 72.5) -> (81, 52.5) projected
  line L1 (81, 72.5) -> (81, 102.5)
  line L2 (42, 27.5) -> (92, 27.5) projected
  line L3 (81, 102.5) -> (81, 92.5)
  line L4 (81, 102.5) -> (83.5, 102.5)
  line L5 (83.5, 102.5) -> (83.5, 92.5)
  line L6 (83.5, 102.5) -> (88.5, 102.5)
  line L7 (88.5, 102.5) -> (88.5, 101)
  line L8 (88.5, 101) -> (83.5, 101)
  line L9 (83.5, 101) -> (83.5, 102.5)
  line L10 (83.5, 92.5) -> (88.5, 92.5)
  line L11 (88.5, 92.5) -> (88.5, 91)
  line L12 (88.5, 91) -> (83.5, 91)
  line L13 (83.5, 91) -> (83.5, 92.5)
  point P0 (0, 0)
  dimension "d93" = 30
  dimension "d94" = 10
  dimension "d95" = 2.5
  dimension "d96" = 5
  dimension "d97" = 1.5
  dimension "d98" = 5
  dimension "d99" = 1.5
extrude "Extrusion7" cut sketch "Sketch3" against normal blind 1.5
sketch "Sketch4" plane through (0, 0, 1.5) normal (0, 0, 1) x (1, 0, 0)
  line L0 (142, -95.5) -> (142, 109.5) projected
  line L1 (142, 109.5) -> (142, 99.5)
  line L2 (142, 99.5) -> (132, 99.5)
  line L3 (132, 99.5) -> (127, 99.5)
  circle A0 centre (127, 99.5) radius 1.5
  circle A1 centre (134.5, 95.1699) radius 1.5
  circle A2 centre (134.5, 103.8301) radius 1.5
  line L4 (142, -95.5) -> (142, -85.5)
  line L5 (142, -85.5) -> (132, -85.5)
  line L6 (132, -85.5) -> (127, -85.5)
  circle A3 centre (127, -85.5) radius 1.5
  circle A4 centre (134.5, -89.8301) radius 1.5
  circle A5 centre (134.5, -81.1699) radius 1.5
  point P0 (0, 0)
  dimension "d102" = 10
  dimension "d103" = 10
  dimension "d104" = 5
  dimension "d105" = 3
  dimension "d108" = 360
  dimension "d110" = 10
  dimension "d111" = 10
  dimension "d112" = 5
  dimension "d113" = 3
  dimension "d116" = 360
extrude "Extrusion8" cut sketch "Sketch4" against normal blind 1.5
properties part number "SIdeFinal"
